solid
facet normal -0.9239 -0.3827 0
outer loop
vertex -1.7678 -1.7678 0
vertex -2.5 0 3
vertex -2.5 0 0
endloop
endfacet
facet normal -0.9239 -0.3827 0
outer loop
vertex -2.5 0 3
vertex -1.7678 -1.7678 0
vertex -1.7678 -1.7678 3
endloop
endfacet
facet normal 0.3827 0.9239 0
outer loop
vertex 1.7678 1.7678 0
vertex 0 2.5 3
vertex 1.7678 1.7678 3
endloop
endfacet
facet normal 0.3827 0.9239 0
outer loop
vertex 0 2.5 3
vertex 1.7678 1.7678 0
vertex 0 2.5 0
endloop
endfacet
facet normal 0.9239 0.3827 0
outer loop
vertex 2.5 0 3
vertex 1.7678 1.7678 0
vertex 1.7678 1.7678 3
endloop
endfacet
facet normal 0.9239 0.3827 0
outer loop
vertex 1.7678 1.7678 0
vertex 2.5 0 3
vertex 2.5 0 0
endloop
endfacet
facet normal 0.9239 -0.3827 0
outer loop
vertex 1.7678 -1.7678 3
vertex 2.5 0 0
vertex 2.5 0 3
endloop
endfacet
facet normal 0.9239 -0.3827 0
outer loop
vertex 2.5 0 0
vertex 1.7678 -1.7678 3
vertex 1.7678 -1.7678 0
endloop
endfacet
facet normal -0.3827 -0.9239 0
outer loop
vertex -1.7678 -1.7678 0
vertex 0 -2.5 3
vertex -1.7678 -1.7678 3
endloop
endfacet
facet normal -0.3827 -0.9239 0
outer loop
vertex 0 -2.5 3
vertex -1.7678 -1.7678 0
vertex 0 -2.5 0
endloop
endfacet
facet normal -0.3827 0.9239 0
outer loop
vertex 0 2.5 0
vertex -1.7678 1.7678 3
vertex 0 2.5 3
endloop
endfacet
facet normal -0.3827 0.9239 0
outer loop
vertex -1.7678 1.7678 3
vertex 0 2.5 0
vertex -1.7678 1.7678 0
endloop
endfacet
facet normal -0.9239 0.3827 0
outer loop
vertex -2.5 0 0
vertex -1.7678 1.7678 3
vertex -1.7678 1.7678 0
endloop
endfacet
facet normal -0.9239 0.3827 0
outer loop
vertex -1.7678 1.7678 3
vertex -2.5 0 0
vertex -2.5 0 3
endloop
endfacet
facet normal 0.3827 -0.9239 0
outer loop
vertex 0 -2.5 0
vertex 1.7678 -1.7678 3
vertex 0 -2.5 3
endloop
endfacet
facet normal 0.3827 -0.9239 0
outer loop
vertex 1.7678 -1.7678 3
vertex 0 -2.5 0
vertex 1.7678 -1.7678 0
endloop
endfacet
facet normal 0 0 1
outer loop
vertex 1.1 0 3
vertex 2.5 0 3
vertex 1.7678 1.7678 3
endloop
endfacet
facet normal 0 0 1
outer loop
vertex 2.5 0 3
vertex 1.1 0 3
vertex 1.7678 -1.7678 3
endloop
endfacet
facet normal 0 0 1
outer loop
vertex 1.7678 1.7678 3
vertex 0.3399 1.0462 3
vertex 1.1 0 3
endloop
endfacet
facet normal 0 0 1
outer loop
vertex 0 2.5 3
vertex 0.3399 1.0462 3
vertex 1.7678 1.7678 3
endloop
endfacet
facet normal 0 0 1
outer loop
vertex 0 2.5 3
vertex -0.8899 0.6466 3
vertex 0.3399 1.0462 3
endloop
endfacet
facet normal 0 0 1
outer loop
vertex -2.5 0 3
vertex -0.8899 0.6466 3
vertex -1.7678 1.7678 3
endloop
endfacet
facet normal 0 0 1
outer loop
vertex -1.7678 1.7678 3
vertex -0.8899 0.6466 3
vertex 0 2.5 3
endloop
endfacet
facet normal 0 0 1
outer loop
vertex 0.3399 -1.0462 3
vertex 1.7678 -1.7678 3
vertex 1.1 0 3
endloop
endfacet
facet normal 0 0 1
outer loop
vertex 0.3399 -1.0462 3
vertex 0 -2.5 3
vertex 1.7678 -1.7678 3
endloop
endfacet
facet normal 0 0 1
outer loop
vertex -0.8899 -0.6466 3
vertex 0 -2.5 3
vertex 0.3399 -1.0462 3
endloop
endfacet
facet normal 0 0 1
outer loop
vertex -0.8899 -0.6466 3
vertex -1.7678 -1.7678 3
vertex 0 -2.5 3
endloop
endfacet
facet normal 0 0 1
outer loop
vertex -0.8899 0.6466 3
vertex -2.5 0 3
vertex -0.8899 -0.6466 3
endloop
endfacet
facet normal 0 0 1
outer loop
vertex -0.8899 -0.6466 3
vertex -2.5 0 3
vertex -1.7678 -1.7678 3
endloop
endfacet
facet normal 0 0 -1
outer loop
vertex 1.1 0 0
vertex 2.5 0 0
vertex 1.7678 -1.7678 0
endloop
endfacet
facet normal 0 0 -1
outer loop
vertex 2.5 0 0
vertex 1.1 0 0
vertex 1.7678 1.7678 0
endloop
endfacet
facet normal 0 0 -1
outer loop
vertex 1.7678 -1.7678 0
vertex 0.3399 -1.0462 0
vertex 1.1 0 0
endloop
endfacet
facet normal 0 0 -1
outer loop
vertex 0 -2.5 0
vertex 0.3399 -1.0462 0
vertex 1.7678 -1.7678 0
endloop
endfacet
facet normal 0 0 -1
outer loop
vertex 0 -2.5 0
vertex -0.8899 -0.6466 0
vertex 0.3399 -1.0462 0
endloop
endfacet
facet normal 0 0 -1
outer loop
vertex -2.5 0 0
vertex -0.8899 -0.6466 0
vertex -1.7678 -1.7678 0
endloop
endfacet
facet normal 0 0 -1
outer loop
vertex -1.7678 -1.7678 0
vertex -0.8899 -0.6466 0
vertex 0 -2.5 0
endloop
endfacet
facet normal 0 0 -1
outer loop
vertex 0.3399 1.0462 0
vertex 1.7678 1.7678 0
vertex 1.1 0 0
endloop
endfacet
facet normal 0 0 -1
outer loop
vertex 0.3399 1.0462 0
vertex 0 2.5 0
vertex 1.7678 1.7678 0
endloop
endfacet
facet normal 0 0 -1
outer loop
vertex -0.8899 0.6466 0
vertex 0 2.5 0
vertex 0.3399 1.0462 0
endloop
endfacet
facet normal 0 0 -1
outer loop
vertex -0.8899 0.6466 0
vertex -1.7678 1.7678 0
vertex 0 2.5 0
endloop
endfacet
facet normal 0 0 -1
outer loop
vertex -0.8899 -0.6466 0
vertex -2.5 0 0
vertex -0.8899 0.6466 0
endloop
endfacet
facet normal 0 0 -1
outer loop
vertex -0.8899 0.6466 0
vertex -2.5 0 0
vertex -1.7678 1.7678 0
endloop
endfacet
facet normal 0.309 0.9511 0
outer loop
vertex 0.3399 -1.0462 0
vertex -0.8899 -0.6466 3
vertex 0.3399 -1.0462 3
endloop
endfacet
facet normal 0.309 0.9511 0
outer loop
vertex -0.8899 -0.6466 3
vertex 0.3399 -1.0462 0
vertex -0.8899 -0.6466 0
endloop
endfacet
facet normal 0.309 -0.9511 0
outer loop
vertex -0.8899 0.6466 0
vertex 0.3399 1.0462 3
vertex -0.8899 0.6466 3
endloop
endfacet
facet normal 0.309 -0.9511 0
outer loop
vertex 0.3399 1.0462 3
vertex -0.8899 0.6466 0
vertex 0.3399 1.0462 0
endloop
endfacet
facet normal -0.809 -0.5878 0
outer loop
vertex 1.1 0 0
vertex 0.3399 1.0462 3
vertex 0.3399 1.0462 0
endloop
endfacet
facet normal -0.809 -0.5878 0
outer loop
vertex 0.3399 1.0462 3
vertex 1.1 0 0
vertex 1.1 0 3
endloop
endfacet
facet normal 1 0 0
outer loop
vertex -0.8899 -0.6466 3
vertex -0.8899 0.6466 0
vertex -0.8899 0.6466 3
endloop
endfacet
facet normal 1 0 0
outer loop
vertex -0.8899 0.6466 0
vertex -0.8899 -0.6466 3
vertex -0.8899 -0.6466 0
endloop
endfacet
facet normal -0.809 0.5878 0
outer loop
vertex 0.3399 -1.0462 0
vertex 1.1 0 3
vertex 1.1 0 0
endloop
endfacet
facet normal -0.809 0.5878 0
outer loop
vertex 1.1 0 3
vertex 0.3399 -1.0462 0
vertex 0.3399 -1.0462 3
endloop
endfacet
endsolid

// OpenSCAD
difference() {
    cylinder(h = 3, r = 2.5, center = false);
    //h:3,3
    //r:1.5,3

    cylinder(h = 3, r = 1.1, center = false);
    }
    //r:0.9,1.9,1.3,1.1
